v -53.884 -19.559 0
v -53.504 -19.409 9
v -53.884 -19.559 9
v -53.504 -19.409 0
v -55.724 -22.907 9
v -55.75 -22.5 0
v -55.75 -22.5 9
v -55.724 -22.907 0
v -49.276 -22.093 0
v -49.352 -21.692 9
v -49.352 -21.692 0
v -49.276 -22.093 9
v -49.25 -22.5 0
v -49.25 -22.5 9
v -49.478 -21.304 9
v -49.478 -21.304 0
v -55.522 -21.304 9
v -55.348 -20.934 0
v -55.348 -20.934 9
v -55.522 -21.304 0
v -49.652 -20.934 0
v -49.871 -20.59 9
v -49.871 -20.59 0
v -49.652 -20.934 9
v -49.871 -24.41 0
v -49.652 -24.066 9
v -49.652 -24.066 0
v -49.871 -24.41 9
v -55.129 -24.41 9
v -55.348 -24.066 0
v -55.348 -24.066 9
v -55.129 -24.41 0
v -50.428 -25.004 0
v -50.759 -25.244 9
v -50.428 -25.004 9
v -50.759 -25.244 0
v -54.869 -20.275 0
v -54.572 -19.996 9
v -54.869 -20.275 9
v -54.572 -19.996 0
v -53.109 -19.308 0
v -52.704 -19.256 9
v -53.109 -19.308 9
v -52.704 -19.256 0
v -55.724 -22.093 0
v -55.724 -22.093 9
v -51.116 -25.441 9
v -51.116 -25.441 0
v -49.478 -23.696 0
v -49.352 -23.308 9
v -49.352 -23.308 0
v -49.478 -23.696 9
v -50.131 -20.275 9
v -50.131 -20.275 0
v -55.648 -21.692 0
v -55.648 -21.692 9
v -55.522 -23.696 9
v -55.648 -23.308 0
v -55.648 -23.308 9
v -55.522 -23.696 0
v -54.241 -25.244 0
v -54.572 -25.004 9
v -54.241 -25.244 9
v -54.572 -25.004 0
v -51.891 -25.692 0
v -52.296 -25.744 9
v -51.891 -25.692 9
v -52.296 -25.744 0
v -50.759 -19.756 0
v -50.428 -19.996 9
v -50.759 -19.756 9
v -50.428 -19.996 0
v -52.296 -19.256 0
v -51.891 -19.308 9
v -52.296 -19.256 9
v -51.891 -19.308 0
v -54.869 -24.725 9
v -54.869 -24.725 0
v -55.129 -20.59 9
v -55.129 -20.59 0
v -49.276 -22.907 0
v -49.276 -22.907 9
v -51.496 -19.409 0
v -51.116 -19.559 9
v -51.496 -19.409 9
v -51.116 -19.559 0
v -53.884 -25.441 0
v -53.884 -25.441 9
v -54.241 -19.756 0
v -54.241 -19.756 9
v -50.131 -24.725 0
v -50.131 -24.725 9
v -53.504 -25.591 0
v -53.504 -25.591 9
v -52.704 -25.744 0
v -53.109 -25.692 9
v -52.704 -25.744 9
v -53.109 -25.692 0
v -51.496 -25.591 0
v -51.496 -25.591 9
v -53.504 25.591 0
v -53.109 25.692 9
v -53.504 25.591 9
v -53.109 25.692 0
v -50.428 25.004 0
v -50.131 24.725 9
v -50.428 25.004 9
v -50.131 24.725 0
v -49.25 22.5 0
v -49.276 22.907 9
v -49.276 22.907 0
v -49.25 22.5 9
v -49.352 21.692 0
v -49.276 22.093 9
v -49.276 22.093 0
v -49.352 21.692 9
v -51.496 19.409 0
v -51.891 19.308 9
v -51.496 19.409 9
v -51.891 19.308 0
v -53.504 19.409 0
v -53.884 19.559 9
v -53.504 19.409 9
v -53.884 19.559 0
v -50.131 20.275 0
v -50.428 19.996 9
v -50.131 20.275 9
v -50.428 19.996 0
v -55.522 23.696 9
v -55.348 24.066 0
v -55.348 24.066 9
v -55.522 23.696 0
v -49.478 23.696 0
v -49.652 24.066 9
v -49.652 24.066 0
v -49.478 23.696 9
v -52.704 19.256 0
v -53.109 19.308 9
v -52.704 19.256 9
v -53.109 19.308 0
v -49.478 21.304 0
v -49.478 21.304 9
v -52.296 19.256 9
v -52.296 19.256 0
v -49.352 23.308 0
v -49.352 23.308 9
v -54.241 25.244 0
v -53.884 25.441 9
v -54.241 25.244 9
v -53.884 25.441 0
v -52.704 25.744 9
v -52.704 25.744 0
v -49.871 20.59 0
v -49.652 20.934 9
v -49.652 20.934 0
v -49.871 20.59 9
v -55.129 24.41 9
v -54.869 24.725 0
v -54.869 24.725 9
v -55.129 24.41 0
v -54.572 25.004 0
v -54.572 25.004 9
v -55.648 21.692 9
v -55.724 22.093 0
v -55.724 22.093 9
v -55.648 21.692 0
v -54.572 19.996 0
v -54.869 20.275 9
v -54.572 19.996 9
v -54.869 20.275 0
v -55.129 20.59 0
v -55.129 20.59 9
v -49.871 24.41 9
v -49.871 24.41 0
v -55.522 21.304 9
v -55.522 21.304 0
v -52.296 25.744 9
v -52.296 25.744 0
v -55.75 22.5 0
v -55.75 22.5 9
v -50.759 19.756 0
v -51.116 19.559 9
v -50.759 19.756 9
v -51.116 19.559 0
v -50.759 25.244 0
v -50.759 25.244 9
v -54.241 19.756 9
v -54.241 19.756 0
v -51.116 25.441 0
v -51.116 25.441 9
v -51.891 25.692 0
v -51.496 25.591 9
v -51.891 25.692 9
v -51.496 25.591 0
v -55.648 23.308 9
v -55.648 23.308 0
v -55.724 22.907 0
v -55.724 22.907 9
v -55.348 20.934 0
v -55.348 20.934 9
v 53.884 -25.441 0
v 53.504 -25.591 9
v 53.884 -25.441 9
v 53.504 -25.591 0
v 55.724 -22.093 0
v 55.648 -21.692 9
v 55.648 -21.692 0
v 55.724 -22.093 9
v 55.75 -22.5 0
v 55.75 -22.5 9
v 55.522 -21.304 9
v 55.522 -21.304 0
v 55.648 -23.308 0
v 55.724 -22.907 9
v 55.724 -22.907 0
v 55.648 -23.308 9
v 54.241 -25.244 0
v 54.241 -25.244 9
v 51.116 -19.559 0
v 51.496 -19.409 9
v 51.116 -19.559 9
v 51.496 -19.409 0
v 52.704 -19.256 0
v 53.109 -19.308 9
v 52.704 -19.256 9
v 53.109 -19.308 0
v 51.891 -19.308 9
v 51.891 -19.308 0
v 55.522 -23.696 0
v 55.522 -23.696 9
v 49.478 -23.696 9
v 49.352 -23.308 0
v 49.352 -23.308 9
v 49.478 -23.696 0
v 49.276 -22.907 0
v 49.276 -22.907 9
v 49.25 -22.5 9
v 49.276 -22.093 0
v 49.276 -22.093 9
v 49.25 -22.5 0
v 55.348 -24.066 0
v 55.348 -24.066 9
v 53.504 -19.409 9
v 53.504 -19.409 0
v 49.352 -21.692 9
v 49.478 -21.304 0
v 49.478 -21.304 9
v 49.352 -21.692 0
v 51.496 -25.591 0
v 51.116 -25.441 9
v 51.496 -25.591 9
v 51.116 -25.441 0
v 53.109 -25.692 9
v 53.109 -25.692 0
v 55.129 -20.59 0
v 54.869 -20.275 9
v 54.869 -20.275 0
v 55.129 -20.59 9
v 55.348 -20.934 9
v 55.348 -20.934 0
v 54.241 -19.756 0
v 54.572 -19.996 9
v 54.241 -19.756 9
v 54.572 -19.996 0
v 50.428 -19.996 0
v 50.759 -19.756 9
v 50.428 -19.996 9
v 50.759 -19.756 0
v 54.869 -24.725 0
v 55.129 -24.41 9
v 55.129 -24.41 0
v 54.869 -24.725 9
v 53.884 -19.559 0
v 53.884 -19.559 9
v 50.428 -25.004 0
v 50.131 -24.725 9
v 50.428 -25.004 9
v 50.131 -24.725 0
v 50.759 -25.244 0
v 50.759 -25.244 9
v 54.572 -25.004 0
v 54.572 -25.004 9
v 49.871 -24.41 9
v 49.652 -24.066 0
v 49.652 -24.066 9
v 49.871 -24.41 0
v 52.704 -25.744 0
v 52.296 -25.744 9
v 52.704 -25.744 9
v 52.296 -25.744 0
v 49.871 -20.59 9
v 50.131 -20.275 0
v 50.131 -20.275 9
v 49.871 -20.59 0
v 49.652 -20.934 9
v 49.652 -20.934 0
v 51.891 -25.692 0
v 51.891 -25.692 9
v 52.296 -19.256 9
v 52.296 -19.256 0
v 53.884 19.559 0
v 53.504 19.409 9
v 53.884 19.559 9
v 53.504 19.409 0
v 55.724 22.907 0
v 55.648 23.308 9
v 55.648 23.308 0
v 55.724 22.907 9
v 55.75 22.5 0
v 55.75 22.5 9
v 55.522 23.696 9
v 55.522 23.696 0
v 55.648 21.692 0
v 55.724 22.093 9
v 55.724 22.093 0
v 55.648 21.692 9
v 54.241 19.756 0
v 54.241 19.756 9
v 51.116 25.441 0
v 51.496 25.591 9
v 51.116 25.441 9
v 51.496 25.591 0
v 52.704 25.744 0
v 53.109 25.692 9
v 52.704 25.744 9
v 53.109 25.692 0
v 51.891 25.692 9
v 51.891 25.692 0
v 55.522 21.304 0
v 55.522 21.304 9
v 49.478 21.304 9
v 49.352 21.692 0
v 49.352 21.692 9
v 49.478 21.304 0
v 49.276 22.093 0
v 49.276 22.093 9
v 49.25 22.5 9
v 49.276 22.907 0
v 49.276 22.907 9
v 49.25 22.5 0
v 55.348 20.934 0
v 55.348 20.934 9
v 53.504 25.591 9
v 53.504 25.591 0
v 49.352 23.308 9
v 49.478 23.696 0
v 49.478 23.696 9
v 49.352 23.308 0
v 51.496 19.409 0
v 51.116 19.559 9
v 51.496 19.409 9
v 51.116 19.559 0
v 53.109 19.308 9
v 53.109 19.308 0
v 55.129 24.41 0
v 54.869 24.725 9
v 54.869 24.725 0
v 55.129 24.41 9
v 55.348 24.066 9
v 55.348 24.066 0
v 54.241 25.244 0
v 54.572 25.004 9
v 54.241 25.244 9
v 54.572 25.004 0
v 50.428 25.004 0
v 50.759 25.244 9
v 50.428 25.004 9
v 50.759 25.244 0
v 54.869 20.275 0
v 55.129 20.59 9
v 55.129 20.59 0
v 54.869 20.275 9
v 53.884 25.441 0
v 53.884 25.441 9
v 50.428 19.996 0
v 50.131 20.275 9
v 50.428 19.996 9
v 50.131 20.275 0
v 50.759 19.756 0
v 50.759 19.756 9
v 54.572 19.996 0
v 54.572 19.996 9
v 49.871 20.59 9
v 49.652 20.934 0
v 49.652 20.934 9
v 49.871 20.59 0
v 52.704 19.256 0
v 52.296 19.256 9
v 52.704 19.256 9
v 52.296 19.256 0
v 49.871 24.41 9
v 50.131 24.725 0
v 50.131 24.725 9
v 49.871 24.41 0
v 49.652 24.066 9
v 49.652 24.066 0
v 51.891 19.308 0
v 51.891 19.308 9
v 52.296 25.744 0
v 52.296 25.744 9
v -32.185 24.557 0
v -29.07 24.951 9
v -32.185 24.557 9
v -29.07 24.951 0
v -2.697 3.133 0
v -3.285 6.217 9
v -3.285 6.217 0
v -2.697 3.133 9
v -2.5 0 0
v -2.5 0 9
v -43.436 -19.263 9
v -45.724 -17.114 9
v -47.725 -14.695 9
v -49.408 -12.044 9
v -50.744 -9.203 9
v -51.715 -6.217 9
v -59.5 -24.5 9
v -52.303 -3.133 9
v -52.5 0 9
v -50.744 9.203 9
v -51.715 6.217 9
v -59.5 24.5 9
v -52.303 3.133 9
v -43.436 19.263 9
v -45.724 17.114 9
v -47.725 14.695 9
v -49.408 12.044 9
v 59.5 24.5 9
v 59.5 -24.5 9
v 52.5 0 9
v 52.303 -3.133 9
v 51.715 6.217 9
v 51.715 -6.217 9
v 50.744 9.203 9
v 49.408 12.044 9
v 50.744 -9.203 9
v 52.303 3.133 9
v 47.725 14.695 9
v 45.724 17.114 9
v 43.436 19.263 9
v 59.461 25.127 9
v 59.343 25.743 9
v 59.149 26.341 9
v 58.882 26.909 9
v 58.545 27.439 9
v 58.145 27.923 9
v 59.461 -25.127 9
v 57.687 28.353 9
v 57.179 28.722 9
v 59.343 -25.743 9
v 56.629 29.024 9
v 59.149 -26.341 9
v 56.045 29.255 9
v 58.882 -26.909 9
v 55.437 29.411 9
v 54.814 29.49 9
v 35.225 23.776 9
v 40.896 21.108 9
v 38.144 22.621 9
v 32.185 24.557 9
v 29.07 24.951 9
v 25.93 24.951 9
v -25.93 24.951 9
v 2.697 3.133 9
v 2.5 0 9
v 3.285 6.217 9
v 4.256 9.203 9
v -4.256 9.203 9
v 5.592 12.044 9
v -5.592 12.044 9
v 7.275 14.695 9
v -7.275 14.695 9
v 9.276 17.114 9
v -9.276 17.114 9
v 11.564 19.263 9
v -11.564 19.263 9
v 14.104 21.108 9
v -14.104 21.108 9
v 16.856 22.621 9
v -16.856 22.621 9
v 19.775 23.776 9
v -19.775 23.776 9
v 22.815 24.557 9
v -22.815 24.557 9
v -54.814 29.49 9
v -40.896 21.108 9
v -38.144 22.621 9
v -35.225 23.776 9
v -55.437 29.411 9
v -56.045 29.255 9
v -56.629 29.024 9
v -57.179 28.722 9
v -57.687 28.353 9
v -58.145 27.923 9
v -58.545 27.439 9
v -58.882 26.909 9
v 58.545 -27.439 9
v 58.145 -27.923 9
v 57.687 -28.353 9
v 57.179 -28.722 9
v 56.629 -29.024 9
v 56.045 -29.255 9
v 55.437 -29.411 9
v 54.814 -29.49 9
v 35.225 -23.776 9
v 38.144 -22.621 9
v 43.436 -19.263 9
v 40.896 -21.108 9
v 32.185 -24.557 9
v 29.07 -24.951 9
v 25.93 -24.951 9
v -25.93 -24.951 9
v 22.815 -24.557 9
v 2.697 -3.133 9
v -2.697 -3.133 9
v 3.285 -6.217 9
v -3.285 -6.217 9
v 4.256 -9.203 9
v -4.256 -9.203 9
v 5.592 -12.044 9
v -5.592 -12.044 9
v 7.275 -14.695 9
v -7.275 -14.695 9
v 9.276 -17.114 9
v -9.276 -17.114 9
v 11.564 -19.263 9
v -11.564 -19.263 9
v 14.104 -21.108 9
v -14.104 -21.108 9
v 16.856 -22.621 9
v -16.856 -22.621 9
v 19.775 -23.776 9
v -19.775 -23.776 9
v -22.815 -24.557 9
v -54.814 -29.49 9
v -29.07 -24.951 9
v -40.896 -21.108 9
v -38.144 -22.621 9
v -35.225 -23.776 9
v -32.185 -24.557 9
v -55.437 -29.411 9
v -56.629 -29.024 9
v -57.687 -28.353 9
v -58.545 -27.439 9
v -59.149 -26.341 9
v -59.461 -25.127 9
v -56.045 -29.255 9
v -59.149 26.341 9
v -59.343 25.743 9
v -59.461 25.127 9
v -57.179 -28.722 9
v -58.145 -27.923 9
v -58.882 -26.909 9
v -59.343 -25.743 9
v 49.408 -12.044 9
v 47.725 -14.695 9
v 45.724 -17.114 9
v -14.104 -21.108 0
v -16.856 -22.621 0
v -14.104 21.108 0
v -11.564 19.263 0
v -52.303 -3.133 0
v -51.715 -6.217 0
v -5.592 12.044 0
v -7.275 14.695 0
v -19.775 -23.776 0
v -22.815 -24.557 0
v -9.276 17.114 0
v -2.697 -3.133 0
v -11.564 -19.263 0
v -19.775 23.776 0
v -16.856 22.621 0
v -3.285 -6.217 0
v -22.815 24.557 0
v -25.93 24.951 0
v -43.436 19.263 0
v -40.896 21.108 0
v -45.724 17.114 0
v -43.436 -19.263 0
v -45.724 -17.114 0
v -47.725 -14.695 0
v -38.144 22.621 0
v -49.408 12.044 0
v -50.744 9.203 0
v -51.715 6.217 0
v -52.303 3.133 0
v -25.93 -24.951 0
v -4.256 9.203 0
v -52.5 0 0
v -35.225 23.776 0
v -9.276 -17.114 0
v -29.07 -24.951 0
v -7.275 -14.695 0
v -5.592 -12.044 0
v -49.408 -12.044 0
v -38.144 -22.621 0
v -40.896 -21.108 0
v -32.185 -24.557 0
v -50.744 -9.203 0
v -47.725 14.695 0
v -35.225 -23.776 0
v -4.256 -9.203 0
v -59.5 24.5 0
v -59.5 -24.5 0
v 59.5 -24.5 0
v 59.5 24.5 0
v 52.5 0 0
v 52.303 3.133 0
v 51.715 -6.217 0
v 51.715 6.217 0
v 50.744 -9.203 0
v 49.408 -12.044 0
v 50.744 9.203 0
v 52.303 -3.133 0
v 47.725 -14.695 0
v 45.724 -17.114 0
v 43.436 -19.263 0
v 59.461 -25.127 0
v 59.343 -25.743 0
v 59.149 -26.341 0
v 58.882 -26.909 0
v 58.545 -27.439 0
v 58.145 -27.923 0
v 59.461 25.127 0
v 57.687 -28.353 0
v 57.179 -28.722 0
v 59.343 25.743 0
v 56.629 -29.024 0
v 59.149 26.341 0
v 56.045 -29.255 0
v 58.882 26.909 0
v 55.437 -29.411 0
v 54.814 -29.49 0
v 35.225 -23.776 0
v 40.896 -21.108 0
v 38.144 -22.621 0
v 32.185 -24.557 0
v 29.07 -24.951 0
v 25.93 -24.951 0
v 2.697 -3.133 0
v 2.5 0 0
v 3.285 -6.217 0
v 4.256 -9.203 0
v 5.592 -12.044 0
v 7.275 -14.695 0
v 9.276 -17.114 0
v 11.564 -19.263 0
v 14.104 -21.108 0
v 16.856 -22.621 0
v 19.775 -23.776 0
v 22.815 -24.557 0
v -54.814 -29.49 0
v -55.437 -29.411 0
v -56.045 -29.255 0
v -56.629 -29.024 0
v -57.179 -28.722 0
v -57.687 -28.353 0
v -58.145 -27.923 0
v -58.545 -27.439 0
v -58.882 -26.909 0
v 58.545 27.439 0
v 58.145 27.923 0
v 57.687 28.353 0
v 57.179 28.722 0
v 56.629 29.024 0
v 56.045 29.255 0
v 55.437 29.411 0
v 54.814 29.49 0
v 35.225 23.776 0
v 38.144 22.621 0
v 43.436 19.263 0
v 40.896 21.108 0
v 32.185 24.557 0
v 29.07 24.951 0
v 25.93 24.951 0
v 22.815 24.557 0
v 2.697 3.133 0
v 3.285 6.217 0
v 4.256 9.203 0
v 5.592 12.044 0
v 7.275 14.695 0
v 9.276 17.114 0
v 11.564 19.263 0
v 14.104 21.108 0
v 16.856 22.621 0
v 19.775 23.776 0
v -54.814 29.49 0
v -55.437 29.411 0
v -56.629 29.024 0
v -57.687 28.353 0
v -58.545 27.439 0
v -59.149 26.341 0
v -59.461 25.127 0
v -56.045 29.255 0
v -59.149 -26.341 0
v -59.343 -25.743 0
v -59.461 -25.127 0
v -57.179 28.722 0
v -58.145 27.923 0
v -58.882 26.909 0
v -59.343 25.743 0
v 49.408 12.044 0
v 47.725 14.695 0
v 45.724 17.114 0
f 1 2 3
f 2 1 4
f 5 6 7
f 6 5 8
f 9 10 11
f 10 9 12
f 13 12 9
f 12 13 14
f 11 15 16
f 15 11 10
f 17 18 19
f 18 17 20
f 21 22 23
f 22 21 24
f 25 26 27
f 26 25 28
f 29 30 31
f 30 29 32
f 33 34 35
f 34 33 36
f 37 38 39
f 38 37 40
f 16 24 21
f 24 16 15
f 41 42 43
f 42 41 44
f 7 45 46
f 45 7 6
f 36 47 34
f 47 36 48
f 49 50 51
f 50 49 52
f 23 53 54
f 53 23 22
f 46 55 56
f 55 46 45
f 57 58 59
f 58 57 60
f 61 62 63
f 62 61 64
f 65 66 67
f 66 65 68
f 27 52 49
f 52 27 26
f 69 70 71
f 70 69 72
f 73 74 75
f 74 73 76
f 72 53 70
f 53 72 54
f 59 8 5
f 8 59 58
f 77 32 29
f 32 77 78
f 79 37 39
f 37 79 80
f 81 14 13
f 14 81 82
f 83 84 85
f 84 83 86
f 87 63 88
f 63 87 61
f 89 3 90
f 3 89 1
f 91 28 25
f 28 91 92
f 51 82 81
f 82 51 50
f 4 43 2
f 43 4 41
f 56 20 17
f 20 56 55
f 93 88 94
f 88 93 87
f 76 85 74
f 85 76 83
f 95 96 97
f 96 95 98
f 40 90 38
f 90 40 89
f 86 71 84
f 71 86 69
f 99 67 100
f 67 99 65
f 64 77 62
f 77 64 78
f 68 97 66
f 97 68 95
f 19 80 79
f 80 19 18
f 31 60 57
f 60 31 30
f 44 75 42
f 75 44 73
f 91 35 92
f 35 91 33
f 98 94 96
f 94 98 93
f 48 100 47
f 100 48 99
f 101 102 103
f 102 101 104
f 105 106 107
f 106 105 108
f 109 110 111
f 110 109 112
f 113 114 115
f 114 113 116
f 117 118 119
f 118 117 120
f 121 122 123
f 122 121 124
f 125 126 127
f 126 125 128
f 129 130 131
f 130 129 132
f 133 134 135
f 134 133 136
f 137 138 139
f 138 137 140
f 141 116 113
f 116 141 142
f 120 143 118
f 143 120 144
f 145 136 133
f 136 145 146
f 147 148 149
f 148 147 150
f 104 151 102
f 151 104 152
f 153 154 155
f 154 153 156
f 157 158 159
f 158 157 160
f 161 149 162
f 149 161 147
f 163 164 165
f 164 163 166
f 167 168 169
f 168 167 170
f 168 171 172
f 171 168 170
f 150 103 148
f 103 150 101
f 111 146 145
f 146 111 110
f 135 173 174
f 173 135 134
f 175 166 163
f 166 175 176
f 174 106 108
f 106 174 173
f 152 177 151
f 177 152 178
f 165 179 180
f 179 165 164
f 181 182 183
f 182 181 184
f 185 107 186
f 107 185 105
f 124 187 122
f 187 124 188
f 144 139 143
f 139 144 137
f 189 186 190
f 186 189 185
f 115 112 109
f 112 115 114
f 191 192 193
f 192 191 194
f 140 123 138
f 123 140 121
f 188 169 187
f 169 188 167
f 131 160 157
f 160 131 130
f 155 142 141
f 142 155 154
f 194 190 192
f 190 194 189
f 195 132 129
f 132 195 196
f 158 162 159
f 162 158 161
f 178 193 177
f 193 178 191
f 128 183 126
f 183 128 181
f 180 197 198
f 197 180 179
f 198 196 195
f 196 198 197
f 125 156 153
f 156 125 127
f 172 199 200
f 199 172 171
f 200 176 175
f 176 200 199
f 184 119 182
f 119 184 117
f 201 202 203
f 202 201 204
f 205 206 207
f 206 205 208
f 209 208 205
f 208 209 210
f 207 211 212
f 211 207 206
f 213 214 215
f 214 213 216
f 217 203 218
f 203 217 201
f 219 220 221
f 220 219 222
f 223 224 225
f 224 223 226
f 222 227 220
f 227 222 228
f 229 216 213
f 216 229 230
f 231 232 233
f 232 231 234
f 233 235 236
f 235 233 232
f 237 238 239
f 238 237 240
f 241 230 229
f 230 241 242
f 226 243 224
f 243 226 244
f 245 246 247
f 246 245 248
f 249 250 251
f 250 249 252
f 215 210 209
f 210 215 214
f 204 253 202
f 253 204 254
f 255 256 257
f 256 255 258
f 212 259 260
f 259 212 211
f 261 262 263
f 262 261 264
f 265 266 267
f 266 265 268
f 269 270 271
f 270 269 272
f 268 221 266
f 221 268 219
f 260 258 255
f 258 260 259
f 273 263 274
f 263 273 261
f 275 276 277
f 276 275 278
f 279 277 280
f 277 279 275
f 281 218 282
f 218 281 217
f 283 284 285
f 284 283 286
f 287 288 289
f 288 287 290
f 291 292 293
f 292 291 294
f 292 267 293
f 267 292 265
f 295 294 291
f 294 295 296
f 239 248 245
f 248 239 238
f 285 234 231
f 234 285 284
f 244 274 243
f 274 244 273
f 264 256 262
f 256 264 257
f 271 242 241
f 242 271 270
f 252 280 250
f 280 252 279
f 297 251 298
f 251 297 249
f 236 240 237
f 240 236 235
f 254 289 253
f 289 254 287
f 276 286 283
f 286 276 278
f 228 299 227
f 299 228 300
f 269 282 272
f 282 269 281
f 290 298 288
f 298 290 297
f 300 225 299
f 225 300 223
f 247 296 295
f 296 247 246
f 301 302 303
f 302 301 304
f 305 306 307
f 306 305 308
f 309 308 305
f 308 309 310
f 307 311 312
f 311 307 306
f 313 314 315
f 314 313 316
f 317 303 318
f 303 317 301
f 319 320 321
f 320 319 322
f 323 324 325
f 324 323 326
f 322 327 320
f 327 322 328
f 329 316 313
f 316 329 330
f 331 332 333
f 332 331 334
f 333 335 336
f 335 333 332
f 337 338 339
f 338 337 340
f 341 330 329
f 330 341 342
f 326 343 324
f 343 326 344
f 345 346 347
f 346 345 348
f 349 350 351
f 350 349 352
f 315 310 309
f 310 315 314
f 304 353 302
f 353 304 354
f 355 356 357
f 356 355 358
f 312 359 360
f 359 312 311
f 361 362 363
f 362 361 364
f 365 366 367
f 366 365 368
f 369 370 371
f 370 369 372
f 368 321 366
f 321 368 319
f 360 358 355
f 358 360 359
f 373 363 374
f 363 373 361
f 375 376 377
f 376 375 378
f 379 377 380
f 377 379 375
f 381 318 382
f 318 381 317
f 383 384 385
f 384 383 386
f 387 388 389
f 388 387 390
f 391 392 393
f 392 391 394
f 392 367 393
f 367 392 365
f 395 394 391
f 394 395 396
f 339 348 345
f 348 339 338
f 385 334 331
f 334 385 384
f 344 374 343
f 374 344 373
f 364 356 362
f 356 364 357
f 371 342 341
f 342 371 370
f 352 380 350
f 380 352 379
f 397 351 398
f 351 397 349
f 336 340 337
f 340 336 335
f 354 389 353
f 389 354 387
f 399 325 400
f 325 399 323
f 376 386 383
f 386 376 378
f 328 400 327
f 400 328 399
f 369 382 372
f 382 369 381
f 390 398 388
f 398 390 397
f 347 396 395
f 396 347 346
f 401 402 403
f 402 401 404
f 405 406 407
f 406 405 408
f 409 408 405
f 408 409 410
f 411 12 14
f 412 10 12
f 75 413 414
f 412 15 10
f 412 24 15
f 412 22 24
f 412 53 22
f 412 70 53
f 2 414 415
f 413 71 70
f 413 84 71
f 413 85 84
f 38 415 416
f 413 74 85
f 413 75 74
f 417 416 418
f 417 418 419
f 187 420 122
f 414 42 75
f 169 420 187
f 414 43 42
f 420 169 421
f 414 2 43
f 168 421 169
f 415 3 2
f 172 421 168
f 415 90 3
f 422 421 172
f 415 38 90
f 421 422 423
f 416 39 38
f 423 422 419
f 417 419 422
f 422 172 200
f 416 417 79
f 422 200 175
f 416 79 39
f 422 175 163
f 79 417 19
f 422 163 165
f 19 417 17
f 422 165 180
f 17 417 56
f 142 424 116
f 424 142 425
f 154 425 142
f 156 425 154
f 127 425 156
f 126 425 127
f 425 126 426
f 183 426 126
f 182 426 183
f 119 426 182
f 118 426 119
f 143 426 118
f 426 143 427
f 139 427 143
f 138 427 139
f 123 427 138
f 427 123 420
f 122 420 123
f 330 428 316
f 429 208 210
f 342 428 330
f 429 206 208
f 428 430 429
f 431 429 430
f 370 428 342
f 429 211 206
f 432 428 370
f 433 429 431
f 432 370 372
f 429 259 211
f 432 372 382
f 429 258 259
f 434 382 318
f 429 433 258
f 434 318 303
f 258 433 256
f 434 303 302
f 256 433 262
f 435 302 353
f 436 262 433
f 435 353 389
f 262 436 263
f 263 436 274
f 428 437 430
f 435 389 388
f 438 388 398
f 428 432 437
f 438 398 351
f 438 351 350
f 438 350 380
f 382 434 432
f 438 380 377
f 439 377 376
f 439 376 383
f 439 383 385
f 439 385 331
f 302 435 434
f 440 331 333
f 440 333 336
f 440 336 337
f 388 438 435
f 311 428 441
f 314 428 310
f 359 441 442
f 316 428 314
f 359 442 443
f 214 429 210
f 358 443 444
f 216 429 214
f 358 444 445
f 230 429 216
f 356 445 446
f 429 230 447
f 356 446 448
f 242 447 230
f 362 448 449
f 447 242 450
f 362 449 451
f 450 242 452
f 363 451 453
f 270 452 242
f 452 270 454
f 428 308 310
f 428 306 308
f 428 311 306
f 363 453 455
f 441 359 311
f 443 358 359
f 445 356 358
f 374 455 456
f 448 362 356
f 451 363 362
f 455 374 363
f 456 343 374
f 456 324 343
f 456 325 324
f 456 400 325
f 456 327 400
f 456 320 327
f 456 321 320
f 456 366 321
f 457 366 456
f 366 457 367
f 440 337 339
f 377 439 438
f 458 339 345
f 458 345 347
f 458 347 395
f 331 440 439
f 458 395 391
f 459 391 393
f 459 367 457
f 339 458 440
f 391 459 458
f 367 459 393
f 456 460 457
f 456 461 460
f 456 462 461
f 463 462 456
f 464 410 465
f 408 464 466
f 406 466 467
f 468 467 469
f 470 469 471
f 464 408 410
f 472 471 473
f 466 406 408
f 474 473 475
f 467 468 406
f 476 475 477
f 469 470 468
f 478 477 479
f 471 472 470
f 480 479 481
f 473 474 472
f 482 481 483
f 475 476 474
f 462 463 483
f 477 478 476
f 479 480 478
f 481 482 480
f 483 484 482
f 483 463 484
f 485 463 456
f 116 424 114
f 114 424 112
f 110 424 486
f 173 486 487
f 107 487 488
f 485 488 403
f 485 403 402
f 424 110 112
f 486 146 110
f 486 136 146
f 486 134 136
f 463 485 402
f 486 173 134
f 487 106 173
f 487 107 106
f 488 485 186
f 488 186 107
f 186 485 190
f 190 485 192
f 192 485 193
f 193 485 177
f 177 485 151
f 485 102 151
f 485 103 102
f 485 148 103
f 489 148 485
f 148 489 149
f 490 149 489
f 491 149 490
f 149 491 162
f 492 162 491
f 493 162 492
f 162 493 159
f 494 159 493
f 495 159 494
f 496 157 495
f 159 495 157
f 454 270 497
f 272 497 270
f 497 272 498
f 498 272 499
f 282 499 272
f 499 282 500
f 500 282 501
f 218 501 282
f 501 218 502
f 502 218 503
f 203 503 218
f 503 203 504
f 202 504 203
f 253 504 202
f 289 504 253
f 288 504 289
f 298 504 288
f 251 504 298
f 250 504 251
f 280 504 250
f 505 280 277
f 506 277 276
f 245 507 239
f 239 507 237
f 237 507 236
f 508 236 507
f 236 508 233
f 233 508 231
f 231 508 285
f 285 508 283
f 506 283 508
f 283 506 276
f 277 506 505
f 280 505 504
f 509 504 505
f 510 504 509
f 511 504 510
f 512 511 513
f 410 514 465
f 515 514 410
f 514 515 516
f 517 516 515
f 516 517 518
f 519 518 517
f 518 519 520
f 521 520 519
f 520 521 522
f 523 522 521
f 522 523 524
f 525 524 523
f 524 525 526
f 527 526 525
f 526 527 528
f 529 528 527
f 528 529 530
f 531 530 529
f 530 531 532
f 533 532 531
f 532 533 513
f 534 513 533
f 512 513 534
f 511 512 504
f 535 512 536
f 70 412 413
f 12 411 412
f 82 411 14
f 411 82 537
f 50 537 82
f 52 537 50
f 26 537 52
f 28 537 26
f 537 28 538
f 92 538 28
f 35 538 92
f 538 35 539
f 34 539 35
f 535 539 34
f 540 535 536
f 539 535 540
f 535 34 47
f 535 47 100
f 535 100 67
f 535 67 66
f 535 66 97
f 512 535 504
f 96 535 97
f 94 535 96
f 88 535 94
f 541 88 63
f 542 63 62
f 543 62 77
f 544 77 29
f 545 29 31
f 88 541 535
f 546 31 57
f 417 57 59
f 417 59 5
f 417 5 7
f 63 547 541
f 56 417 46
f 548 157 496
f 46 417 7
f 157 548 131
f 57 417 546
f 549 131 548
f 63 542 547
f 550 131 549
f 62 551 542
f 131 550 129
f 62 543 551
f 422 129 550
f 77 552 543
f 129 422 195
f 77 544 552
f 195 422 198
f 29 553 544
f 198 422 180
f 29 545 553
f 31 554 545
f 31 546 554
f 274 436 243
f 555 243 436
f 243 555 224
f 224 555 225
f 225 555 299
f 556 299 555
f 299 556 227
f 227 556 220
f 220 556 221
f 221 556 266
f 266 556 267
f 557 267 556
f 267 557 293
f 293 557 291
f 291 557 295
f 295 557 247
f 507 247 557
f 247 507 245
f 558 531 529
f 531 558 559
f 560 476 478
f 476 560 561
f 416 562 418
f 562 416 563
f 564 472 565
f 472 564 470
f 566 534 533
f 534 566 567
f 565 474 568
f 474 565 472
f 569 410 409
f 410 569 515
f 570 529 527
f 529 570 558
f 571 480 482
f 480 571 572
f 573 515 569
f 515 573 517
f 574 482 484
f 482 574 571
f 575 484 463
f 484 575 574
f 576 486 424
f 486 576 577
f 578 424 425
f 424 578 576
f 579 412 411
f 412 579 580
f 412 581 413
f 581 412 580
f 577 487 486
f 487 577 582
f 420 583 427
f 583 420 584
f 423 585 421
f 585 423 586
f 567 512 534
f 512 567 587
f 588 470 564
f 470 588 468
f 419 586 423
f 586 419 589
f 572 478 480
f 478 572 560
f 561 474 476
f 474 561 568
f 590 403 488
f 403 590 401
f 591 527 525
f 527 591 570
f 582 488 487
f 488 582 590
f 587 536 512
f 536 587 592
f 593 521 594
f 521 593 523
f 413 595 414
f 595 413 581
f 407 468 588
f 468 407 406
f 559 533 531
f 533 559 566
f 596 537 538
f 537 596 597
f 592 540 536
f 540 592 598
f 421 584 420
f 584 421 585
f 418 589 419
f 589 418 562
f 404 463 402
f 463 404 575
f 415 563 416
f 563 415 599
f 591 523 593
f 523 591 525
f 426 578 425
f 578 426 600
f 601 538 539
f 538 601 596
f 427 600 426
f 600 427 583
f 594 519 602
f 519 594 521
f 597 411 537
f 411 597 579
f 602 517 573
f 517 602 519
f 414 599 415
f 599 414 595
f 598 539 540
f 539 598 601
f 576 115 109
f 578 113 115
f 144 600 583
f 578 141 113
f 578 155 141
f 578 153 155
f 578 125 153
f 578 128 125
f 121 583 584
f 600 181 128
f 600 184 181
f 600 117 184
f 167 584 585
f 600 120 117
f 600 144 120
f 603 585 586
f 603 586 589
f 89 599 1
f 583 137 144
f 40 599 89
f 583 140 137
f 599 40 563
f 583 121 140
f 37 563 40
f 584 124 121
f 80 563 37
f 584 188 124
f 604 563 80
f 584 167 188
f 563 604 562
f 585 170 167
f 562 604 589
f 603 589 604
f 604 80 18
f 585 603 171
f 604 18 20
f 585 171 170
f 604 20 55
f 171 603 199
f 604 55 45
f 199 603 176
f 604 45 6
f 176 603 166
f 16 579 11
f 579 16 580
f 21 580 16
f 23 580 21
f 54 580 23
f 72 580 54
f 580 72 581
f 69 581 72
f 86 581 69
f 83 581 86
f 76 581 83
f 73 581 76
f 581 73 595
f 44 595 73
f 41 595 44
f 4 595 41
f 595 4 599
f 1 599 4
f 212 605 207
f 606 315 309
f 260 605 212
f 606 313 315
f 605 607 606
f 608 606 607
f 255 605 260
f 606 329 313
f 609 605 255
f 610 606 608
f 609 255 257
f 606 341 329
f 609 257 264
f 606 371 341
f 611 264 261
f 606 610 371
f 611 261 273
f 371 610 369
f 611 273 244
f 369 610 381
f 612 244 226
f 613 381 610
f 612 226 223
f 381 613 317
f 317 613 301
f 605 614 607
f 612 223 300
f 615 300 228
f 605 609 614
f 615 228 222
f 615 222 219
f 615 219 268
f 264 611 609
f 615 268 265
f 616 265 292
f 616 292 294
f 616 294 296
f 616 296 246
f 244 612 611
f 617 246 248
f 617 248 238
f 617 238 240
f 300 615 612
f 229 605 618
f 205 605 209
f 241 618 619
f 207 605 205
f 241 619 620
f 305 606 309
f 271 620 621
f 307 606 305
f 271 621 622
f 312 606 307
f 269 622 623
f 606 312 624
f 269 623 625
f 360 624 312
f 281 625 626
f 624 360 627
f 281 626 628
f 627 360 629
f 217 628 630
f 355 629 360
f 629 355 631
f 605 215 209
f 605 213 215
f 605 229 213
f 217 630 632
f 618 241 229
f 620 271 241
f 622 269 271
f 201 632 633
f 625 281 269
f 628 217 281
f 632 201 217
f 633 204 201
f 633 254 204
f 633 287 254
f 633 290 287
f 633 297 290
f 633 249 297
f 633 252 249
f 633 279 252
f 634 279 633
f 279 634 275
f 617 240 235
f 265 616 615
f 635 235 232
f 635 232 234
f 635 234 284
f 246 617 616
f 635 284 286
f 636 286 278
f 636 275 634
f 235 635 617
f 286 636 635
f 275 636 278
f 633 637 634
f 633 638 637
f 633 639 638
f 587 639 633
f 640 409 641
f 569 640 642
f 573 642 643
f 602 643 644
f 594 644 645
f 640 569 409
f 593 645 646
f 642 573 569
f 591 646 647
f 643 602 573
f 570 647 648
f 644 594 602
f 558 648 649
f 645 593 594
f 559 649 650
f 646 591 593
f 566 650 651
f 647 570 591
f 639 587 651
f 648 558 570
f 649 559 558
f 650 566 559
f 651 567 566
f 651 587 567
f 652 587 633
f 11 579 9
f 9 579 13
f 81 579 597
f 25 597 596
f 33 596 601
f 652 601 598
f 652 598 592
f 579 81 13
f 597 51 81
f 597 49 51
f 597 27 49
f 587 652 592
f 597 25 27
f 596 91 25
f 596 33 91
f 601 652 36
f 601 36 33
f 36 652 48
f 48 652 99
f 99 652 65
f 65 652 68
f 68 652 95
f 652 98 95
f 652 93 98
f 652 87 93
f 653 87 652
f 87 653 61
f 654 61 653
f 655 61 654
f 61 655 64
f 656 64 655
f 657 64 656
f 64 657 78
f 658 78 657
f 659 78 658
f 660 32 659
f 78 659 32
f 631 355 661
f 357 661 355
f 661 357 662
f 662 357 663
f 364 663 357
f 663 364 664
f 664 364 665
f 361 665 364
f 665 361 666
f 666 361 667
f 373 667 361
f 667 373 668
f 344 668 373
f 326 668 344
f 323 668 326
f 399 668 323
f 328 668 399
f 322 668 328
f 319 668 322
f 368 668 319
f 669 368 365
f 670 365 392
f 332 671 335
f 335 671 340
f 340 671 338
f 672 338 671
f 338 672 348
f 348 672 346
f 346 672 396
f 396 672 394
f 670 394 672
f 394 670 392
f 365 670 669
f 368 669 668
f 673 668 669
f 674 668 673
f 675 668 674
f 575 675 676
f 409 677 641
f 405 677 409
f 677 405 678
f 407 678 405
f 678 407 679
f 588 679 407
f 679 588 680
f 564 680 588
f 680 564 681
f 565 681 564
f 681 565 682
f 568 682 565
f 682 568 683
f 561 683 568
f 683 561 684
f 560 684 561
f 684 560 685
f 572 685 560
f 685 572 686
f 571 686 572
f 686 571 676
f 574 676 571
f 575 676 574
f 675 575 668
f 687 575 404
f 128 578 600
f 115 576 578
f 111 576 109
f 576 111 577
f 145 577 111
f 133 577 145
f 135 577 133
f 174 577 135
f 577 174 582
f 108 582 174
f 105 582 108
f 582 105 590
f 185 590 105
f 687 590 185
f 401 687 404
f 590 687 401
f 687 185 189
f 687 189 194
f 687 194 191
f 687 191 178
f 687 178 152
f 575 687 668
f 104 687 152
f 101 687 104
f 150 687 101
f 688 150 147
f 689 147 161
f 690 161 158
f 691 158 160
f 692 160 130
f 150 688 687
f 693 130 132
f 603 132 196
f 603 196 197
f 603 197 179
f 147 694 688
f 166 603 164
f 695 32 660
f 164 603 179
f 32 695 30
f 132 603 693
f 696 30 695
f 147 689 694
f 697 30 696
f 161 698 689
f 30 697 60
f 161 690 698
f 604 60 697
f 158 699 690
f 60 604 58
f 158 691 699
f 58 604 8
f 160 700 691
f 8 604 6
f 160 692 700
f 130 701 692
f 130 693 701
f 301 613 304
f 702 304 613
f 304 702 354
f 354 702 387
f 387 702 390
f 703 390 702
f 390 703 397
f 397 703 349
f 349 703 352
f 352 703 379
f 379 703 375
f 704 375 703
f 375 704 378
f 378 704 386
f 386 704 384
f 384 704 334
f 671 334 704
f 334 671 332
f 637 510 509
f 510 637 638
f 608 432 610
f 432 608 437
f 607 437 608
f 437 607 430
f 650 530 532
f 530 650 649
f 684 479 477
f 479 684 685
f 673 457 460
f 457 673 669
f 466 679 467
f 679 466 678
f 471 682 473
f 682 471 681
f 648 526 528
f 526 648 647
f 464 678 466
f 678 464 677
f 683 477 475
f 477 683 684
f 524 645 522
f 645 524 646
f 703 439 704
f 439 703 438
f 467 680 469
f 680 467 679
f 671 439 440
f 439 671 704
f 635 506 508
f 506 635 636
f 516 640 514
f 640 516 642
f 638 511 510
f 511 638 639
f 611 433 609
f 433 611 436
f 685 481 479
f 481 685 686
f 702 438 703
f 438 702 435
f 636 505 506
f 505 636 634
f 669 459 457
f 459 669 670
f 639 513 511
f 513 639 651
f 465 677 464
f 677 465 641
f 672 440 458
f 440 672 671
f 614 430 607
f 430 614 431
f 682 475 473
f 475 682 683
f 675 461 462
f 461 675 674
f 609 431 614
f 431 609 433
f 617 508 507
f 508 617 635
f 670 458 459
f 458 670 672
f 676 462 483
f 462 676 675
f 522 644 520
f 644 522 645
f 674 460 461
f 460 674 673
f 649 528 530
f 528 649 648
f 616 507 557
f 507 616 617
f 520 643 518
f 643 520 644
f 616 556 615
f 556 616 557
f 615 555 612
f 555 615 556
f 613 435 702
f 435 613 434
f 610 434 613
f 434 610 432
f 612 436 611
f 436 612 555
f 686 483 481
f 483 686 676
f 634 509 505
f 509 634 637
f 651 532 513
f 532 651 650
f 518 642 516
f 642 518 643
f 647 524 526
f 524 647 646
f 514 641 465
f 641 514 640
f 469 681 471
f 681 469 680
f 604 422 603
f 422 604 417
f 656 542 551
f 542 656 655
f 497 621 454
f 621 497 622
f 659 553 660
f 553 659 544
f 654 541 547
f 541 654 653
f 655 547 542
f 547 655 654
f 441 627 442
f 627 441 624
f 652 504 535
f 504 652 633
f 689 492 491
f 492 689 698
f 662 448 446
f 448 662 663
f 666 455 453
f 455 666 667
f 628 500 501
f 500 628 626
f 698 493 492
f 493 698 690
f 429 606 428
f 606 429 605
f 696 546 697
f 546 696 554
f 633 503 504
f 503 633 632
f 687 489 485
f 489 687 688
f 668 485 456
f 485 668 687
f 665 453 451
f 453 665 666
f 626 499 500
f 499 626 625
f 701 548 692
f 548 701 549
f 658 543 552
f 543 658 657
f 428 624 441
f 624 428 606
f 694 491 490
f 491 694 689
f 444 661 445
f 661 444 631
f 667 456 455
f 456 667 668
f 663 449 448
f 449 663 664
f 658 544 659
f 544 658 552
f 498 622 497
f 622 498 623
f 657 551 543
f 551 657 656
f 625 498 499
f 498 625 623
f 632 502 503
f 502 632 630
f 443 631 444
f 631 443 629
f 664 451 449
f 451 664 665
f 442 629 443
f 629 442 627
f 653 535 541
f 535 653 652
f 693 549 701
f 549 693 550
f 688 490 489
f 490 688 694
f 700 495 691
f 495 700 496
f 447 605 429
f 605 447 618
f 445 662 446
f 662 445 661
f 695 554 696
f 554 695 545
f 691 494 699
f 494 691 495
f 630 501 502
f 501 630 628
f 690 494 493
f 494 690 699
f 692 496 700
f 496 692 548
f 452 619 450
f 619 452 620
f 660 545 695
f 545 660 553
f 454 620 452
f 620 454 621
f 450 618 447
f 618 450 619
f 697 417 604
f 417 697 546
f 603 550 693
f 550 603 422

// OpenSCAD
$fn = 50;


difference() {
	union() {
		hull() {
			translate(v = [-54.5000000000, 24.5000000000, 0]) {
				cylinder(h = 9, r = 5);
			}
			translate(v = [54.5000000000, 24.5000000000, 0]) {
				cylinder(h = 9, r = 5);
			}
			translate(v = [-54.5000000000, -24.5000000000, 0]) {
				cylinder(h = 9, r = 5);
			}
			translate(v = [54.5000000000, -24.5000000000, 0]) {
				cylinder(h = 9, r = 5);
			}
		}
	}
	union() {
		#translate(v = [-52.5000000000, -22.5000000000, -100.0000000000]) {
			cylinder(h = 200, r = 3.2500000000);
		}
		#translate(v = [-52.5000000000, 22.5000000000, -100.0000000000]) {
			cylinder(h = 200, r = 3.2500000000);
		}
		#translate(v = [52.5000000000, -22.5000000000, -100.0000000000]) {
			cylinder(h = 200, r = 3.2500000000);
		}
		#translate(v = [52.5000000000, 22.5000000000, -100.0000000000]) {
			cylinder(h = 200, r = 3.2500000000);
		}
		#translate(v = [-27.5000000000, 0, 0]) {
			cylinder(h = 9, r = 25.0000000000);
		}
		#translate(v = [27.5000000000, 0, 0]) {
			cylinder(h = 9, r = 25.0000000000);
		}
	}
}
